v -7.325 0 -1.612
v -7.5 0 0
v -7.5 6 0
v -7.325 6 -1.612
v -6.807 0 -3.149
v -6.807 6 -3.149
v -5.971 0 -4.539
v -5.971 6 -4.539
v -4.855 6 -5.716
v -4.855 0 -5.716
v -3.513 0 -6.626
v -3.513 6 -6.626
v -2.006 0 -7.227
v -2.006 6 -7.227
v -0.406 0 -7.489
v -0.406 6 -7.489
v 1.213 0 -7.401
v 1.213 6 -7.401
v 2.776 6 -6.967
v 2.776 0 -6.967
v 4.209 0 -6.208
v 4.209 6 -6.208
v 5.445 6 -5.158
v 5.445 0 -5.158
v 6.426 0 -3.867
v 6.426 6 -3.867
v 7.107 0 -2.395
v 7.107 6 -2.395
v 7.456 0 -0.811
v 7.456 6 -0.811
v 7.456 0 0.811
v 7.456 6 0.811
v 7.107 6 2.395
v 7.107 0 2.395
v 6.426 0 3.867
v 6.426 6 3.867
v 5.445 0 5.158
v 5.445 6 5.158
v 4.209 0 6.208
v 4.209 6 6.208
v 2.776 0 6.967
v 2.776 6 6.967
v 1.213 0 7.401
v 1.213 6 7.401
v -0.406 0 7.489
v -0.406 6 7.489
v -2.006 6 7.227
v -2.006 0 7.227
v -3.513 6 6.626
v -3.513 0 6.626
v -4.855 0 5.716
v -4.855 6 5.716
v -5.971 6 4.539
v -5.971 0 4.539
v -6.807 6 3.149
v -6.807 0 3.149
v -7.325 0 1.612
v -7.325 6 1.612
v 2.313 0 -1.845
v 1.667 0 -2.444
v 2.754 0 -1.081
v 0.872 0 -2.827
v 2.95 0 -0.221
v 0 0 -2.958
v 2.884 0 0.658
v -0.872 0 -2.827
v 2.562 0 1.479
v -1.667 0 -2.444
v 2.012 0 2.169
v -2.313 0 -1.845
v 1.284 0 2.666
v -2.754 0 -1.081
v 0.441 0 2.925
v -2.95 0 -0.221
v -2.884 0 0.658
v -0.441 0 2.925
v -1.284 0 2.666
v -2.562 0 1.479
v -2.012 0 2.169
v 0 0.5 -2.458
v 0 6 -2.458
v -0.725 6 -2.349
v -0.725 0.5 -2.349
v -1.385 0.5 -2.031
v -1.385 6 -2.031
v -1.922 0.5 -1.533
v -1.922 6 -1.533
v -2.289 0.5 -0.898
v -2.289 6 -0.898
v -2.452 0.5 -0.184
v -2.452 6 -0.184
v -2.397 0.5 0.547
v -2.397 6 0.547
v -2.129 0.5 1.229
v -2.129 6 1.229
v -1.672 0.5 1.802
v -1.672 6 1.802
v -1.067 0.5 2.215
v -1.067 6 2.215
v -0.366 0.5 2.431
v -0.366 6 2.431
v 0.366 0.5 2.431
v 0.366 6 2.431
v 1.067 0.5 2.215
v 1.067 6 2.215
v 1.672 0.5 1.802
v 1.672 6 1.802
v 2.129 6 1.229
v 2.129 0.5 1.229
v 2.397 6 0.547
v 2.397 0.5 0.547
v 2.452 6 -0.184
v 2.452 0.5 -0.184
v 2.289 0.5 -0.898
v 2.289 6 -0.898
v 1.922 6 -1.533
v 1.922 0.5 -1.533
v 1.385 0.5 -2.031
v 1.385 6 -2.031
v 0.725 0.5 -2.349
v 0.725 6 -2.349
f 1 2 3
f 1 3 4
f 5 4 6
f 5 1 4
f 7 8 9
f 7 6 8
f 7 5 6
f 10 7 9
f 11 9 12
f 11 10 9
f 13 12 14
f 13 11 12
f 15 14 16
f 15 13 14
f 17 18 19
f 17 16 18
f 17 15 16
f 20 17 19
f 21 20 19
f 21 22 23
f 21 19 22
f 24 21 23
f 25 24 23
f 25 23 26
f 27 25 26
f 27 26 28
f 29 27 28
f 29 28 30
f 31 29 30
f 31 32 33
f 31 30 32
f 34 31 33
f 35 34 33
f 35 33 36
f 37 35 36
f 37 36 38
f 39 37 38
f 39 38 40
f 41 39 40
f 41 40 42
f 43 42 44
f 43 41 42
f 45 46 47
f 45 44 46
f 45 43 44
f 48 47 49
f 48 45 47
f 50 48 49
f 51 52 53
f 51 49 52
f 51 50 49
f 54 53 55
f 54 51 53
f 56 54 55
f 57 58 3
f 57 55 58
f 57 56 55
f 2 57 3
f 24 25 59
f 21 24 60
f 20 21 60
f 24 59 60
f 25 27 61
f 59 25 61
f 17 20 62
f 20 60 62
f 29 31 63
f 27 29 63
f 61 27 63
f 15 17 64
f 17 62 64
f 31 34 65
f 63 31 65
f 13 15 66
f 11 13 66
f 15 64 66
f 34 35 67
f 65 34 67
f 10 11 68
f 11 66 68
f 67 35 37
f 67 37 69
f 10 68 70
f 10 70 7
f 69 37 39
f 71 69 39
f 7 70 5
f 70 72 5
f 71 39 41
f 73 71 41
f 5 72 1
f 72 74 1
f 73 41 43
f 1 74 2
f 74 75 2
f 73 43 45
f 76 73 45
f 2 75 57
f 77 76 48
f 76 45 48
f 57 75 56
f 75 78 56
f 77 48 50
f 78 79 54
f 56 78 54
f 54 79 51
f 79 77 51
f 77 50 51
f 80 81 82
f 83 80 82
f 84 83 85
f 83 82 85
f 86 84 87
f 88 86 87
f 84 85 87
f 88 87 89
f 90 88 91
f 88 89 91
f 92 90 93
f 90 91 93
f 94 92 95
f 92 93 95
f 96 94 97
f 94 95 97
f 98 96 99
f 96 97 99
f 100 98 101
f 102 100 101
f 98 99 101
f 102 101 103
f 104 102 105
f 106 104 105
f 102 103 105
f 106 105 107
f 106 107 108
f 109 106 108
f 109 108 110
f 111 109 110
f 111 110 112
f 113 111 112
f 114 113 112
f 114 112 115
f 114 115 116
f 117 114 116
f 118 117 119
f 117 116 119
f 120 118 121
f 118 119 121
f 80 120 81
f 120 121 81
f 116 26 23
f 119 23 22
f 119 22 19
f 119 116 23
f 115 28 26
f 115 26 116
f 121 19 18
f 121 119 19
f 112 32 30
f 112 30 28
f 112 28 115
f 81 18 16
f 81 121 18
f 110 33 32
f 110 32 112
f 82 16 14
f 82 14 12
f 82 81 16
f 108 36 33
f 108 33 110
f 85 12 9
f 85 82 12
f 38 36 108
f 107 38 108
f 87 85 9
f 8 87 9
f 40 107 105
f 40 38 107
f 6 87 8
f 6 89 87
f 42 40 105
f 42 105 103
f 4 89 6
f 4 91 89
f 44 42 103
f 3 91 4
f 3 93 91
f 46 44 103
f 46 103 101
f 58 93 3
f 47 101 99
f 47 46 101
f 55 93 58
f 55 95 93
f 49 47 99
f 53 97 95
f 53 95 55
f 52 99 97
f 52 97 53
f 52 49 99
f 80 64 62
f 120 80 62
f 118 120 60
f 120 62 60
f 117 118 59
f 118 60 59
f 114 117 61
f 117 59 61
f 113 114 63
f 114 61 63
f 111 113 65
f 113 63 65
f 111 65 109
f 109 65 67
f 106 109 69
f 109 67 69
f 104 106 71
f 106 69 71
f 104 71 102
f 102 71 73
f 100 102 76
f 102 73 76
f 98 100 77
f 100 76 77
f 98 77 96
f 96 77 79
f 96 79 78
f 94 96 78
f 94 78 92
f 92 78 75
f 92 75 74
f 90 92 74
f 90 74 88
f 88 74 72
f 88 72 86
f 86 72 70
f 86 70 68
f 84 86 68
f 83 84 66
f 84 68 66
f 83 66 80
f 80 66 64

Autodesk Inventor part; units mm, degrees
ref_plane "YZ Plane" through (0, 0, 0) normal (1, 0, 0) x (0, 1, 0)
ref_plane "XZ Plane" through (0, 0, 0) normal (0, 1, 0) x (-1, 0, 0)
ref_plane "XY Plane" through (0, 0, 0) normal (0, 0, 1) x (1, 0, 0)
sketch "Sketch1" plane through (0, 0, 0) normal (0, 1, 0) x (-1, 0, 0)
  circle A0 centre (0, 0) radius 7.5
  dimension "d0" = 15
extrude "Extrusion1" add sketch "Sketch1" along normal blind 6
sketch "Sketch2" plane through (0, 0, 0) normal (0, -1, 0) x (1, 0, 0)
  circle A0 centre (0, 0) radius 7.5 projected
hole "Hole1" at (0, 0, 0) direction (0, 1, 0) diameter 4.917 end through all thread size "M6x1" class "6H" standard "ISO Metric profile"
chamfer "Chamfer1" distance 0.5 angle 45 1 edges at (0, 0, 2.4585)
properties part number "02-13-docisk_K3" material "Stainless Steel"
